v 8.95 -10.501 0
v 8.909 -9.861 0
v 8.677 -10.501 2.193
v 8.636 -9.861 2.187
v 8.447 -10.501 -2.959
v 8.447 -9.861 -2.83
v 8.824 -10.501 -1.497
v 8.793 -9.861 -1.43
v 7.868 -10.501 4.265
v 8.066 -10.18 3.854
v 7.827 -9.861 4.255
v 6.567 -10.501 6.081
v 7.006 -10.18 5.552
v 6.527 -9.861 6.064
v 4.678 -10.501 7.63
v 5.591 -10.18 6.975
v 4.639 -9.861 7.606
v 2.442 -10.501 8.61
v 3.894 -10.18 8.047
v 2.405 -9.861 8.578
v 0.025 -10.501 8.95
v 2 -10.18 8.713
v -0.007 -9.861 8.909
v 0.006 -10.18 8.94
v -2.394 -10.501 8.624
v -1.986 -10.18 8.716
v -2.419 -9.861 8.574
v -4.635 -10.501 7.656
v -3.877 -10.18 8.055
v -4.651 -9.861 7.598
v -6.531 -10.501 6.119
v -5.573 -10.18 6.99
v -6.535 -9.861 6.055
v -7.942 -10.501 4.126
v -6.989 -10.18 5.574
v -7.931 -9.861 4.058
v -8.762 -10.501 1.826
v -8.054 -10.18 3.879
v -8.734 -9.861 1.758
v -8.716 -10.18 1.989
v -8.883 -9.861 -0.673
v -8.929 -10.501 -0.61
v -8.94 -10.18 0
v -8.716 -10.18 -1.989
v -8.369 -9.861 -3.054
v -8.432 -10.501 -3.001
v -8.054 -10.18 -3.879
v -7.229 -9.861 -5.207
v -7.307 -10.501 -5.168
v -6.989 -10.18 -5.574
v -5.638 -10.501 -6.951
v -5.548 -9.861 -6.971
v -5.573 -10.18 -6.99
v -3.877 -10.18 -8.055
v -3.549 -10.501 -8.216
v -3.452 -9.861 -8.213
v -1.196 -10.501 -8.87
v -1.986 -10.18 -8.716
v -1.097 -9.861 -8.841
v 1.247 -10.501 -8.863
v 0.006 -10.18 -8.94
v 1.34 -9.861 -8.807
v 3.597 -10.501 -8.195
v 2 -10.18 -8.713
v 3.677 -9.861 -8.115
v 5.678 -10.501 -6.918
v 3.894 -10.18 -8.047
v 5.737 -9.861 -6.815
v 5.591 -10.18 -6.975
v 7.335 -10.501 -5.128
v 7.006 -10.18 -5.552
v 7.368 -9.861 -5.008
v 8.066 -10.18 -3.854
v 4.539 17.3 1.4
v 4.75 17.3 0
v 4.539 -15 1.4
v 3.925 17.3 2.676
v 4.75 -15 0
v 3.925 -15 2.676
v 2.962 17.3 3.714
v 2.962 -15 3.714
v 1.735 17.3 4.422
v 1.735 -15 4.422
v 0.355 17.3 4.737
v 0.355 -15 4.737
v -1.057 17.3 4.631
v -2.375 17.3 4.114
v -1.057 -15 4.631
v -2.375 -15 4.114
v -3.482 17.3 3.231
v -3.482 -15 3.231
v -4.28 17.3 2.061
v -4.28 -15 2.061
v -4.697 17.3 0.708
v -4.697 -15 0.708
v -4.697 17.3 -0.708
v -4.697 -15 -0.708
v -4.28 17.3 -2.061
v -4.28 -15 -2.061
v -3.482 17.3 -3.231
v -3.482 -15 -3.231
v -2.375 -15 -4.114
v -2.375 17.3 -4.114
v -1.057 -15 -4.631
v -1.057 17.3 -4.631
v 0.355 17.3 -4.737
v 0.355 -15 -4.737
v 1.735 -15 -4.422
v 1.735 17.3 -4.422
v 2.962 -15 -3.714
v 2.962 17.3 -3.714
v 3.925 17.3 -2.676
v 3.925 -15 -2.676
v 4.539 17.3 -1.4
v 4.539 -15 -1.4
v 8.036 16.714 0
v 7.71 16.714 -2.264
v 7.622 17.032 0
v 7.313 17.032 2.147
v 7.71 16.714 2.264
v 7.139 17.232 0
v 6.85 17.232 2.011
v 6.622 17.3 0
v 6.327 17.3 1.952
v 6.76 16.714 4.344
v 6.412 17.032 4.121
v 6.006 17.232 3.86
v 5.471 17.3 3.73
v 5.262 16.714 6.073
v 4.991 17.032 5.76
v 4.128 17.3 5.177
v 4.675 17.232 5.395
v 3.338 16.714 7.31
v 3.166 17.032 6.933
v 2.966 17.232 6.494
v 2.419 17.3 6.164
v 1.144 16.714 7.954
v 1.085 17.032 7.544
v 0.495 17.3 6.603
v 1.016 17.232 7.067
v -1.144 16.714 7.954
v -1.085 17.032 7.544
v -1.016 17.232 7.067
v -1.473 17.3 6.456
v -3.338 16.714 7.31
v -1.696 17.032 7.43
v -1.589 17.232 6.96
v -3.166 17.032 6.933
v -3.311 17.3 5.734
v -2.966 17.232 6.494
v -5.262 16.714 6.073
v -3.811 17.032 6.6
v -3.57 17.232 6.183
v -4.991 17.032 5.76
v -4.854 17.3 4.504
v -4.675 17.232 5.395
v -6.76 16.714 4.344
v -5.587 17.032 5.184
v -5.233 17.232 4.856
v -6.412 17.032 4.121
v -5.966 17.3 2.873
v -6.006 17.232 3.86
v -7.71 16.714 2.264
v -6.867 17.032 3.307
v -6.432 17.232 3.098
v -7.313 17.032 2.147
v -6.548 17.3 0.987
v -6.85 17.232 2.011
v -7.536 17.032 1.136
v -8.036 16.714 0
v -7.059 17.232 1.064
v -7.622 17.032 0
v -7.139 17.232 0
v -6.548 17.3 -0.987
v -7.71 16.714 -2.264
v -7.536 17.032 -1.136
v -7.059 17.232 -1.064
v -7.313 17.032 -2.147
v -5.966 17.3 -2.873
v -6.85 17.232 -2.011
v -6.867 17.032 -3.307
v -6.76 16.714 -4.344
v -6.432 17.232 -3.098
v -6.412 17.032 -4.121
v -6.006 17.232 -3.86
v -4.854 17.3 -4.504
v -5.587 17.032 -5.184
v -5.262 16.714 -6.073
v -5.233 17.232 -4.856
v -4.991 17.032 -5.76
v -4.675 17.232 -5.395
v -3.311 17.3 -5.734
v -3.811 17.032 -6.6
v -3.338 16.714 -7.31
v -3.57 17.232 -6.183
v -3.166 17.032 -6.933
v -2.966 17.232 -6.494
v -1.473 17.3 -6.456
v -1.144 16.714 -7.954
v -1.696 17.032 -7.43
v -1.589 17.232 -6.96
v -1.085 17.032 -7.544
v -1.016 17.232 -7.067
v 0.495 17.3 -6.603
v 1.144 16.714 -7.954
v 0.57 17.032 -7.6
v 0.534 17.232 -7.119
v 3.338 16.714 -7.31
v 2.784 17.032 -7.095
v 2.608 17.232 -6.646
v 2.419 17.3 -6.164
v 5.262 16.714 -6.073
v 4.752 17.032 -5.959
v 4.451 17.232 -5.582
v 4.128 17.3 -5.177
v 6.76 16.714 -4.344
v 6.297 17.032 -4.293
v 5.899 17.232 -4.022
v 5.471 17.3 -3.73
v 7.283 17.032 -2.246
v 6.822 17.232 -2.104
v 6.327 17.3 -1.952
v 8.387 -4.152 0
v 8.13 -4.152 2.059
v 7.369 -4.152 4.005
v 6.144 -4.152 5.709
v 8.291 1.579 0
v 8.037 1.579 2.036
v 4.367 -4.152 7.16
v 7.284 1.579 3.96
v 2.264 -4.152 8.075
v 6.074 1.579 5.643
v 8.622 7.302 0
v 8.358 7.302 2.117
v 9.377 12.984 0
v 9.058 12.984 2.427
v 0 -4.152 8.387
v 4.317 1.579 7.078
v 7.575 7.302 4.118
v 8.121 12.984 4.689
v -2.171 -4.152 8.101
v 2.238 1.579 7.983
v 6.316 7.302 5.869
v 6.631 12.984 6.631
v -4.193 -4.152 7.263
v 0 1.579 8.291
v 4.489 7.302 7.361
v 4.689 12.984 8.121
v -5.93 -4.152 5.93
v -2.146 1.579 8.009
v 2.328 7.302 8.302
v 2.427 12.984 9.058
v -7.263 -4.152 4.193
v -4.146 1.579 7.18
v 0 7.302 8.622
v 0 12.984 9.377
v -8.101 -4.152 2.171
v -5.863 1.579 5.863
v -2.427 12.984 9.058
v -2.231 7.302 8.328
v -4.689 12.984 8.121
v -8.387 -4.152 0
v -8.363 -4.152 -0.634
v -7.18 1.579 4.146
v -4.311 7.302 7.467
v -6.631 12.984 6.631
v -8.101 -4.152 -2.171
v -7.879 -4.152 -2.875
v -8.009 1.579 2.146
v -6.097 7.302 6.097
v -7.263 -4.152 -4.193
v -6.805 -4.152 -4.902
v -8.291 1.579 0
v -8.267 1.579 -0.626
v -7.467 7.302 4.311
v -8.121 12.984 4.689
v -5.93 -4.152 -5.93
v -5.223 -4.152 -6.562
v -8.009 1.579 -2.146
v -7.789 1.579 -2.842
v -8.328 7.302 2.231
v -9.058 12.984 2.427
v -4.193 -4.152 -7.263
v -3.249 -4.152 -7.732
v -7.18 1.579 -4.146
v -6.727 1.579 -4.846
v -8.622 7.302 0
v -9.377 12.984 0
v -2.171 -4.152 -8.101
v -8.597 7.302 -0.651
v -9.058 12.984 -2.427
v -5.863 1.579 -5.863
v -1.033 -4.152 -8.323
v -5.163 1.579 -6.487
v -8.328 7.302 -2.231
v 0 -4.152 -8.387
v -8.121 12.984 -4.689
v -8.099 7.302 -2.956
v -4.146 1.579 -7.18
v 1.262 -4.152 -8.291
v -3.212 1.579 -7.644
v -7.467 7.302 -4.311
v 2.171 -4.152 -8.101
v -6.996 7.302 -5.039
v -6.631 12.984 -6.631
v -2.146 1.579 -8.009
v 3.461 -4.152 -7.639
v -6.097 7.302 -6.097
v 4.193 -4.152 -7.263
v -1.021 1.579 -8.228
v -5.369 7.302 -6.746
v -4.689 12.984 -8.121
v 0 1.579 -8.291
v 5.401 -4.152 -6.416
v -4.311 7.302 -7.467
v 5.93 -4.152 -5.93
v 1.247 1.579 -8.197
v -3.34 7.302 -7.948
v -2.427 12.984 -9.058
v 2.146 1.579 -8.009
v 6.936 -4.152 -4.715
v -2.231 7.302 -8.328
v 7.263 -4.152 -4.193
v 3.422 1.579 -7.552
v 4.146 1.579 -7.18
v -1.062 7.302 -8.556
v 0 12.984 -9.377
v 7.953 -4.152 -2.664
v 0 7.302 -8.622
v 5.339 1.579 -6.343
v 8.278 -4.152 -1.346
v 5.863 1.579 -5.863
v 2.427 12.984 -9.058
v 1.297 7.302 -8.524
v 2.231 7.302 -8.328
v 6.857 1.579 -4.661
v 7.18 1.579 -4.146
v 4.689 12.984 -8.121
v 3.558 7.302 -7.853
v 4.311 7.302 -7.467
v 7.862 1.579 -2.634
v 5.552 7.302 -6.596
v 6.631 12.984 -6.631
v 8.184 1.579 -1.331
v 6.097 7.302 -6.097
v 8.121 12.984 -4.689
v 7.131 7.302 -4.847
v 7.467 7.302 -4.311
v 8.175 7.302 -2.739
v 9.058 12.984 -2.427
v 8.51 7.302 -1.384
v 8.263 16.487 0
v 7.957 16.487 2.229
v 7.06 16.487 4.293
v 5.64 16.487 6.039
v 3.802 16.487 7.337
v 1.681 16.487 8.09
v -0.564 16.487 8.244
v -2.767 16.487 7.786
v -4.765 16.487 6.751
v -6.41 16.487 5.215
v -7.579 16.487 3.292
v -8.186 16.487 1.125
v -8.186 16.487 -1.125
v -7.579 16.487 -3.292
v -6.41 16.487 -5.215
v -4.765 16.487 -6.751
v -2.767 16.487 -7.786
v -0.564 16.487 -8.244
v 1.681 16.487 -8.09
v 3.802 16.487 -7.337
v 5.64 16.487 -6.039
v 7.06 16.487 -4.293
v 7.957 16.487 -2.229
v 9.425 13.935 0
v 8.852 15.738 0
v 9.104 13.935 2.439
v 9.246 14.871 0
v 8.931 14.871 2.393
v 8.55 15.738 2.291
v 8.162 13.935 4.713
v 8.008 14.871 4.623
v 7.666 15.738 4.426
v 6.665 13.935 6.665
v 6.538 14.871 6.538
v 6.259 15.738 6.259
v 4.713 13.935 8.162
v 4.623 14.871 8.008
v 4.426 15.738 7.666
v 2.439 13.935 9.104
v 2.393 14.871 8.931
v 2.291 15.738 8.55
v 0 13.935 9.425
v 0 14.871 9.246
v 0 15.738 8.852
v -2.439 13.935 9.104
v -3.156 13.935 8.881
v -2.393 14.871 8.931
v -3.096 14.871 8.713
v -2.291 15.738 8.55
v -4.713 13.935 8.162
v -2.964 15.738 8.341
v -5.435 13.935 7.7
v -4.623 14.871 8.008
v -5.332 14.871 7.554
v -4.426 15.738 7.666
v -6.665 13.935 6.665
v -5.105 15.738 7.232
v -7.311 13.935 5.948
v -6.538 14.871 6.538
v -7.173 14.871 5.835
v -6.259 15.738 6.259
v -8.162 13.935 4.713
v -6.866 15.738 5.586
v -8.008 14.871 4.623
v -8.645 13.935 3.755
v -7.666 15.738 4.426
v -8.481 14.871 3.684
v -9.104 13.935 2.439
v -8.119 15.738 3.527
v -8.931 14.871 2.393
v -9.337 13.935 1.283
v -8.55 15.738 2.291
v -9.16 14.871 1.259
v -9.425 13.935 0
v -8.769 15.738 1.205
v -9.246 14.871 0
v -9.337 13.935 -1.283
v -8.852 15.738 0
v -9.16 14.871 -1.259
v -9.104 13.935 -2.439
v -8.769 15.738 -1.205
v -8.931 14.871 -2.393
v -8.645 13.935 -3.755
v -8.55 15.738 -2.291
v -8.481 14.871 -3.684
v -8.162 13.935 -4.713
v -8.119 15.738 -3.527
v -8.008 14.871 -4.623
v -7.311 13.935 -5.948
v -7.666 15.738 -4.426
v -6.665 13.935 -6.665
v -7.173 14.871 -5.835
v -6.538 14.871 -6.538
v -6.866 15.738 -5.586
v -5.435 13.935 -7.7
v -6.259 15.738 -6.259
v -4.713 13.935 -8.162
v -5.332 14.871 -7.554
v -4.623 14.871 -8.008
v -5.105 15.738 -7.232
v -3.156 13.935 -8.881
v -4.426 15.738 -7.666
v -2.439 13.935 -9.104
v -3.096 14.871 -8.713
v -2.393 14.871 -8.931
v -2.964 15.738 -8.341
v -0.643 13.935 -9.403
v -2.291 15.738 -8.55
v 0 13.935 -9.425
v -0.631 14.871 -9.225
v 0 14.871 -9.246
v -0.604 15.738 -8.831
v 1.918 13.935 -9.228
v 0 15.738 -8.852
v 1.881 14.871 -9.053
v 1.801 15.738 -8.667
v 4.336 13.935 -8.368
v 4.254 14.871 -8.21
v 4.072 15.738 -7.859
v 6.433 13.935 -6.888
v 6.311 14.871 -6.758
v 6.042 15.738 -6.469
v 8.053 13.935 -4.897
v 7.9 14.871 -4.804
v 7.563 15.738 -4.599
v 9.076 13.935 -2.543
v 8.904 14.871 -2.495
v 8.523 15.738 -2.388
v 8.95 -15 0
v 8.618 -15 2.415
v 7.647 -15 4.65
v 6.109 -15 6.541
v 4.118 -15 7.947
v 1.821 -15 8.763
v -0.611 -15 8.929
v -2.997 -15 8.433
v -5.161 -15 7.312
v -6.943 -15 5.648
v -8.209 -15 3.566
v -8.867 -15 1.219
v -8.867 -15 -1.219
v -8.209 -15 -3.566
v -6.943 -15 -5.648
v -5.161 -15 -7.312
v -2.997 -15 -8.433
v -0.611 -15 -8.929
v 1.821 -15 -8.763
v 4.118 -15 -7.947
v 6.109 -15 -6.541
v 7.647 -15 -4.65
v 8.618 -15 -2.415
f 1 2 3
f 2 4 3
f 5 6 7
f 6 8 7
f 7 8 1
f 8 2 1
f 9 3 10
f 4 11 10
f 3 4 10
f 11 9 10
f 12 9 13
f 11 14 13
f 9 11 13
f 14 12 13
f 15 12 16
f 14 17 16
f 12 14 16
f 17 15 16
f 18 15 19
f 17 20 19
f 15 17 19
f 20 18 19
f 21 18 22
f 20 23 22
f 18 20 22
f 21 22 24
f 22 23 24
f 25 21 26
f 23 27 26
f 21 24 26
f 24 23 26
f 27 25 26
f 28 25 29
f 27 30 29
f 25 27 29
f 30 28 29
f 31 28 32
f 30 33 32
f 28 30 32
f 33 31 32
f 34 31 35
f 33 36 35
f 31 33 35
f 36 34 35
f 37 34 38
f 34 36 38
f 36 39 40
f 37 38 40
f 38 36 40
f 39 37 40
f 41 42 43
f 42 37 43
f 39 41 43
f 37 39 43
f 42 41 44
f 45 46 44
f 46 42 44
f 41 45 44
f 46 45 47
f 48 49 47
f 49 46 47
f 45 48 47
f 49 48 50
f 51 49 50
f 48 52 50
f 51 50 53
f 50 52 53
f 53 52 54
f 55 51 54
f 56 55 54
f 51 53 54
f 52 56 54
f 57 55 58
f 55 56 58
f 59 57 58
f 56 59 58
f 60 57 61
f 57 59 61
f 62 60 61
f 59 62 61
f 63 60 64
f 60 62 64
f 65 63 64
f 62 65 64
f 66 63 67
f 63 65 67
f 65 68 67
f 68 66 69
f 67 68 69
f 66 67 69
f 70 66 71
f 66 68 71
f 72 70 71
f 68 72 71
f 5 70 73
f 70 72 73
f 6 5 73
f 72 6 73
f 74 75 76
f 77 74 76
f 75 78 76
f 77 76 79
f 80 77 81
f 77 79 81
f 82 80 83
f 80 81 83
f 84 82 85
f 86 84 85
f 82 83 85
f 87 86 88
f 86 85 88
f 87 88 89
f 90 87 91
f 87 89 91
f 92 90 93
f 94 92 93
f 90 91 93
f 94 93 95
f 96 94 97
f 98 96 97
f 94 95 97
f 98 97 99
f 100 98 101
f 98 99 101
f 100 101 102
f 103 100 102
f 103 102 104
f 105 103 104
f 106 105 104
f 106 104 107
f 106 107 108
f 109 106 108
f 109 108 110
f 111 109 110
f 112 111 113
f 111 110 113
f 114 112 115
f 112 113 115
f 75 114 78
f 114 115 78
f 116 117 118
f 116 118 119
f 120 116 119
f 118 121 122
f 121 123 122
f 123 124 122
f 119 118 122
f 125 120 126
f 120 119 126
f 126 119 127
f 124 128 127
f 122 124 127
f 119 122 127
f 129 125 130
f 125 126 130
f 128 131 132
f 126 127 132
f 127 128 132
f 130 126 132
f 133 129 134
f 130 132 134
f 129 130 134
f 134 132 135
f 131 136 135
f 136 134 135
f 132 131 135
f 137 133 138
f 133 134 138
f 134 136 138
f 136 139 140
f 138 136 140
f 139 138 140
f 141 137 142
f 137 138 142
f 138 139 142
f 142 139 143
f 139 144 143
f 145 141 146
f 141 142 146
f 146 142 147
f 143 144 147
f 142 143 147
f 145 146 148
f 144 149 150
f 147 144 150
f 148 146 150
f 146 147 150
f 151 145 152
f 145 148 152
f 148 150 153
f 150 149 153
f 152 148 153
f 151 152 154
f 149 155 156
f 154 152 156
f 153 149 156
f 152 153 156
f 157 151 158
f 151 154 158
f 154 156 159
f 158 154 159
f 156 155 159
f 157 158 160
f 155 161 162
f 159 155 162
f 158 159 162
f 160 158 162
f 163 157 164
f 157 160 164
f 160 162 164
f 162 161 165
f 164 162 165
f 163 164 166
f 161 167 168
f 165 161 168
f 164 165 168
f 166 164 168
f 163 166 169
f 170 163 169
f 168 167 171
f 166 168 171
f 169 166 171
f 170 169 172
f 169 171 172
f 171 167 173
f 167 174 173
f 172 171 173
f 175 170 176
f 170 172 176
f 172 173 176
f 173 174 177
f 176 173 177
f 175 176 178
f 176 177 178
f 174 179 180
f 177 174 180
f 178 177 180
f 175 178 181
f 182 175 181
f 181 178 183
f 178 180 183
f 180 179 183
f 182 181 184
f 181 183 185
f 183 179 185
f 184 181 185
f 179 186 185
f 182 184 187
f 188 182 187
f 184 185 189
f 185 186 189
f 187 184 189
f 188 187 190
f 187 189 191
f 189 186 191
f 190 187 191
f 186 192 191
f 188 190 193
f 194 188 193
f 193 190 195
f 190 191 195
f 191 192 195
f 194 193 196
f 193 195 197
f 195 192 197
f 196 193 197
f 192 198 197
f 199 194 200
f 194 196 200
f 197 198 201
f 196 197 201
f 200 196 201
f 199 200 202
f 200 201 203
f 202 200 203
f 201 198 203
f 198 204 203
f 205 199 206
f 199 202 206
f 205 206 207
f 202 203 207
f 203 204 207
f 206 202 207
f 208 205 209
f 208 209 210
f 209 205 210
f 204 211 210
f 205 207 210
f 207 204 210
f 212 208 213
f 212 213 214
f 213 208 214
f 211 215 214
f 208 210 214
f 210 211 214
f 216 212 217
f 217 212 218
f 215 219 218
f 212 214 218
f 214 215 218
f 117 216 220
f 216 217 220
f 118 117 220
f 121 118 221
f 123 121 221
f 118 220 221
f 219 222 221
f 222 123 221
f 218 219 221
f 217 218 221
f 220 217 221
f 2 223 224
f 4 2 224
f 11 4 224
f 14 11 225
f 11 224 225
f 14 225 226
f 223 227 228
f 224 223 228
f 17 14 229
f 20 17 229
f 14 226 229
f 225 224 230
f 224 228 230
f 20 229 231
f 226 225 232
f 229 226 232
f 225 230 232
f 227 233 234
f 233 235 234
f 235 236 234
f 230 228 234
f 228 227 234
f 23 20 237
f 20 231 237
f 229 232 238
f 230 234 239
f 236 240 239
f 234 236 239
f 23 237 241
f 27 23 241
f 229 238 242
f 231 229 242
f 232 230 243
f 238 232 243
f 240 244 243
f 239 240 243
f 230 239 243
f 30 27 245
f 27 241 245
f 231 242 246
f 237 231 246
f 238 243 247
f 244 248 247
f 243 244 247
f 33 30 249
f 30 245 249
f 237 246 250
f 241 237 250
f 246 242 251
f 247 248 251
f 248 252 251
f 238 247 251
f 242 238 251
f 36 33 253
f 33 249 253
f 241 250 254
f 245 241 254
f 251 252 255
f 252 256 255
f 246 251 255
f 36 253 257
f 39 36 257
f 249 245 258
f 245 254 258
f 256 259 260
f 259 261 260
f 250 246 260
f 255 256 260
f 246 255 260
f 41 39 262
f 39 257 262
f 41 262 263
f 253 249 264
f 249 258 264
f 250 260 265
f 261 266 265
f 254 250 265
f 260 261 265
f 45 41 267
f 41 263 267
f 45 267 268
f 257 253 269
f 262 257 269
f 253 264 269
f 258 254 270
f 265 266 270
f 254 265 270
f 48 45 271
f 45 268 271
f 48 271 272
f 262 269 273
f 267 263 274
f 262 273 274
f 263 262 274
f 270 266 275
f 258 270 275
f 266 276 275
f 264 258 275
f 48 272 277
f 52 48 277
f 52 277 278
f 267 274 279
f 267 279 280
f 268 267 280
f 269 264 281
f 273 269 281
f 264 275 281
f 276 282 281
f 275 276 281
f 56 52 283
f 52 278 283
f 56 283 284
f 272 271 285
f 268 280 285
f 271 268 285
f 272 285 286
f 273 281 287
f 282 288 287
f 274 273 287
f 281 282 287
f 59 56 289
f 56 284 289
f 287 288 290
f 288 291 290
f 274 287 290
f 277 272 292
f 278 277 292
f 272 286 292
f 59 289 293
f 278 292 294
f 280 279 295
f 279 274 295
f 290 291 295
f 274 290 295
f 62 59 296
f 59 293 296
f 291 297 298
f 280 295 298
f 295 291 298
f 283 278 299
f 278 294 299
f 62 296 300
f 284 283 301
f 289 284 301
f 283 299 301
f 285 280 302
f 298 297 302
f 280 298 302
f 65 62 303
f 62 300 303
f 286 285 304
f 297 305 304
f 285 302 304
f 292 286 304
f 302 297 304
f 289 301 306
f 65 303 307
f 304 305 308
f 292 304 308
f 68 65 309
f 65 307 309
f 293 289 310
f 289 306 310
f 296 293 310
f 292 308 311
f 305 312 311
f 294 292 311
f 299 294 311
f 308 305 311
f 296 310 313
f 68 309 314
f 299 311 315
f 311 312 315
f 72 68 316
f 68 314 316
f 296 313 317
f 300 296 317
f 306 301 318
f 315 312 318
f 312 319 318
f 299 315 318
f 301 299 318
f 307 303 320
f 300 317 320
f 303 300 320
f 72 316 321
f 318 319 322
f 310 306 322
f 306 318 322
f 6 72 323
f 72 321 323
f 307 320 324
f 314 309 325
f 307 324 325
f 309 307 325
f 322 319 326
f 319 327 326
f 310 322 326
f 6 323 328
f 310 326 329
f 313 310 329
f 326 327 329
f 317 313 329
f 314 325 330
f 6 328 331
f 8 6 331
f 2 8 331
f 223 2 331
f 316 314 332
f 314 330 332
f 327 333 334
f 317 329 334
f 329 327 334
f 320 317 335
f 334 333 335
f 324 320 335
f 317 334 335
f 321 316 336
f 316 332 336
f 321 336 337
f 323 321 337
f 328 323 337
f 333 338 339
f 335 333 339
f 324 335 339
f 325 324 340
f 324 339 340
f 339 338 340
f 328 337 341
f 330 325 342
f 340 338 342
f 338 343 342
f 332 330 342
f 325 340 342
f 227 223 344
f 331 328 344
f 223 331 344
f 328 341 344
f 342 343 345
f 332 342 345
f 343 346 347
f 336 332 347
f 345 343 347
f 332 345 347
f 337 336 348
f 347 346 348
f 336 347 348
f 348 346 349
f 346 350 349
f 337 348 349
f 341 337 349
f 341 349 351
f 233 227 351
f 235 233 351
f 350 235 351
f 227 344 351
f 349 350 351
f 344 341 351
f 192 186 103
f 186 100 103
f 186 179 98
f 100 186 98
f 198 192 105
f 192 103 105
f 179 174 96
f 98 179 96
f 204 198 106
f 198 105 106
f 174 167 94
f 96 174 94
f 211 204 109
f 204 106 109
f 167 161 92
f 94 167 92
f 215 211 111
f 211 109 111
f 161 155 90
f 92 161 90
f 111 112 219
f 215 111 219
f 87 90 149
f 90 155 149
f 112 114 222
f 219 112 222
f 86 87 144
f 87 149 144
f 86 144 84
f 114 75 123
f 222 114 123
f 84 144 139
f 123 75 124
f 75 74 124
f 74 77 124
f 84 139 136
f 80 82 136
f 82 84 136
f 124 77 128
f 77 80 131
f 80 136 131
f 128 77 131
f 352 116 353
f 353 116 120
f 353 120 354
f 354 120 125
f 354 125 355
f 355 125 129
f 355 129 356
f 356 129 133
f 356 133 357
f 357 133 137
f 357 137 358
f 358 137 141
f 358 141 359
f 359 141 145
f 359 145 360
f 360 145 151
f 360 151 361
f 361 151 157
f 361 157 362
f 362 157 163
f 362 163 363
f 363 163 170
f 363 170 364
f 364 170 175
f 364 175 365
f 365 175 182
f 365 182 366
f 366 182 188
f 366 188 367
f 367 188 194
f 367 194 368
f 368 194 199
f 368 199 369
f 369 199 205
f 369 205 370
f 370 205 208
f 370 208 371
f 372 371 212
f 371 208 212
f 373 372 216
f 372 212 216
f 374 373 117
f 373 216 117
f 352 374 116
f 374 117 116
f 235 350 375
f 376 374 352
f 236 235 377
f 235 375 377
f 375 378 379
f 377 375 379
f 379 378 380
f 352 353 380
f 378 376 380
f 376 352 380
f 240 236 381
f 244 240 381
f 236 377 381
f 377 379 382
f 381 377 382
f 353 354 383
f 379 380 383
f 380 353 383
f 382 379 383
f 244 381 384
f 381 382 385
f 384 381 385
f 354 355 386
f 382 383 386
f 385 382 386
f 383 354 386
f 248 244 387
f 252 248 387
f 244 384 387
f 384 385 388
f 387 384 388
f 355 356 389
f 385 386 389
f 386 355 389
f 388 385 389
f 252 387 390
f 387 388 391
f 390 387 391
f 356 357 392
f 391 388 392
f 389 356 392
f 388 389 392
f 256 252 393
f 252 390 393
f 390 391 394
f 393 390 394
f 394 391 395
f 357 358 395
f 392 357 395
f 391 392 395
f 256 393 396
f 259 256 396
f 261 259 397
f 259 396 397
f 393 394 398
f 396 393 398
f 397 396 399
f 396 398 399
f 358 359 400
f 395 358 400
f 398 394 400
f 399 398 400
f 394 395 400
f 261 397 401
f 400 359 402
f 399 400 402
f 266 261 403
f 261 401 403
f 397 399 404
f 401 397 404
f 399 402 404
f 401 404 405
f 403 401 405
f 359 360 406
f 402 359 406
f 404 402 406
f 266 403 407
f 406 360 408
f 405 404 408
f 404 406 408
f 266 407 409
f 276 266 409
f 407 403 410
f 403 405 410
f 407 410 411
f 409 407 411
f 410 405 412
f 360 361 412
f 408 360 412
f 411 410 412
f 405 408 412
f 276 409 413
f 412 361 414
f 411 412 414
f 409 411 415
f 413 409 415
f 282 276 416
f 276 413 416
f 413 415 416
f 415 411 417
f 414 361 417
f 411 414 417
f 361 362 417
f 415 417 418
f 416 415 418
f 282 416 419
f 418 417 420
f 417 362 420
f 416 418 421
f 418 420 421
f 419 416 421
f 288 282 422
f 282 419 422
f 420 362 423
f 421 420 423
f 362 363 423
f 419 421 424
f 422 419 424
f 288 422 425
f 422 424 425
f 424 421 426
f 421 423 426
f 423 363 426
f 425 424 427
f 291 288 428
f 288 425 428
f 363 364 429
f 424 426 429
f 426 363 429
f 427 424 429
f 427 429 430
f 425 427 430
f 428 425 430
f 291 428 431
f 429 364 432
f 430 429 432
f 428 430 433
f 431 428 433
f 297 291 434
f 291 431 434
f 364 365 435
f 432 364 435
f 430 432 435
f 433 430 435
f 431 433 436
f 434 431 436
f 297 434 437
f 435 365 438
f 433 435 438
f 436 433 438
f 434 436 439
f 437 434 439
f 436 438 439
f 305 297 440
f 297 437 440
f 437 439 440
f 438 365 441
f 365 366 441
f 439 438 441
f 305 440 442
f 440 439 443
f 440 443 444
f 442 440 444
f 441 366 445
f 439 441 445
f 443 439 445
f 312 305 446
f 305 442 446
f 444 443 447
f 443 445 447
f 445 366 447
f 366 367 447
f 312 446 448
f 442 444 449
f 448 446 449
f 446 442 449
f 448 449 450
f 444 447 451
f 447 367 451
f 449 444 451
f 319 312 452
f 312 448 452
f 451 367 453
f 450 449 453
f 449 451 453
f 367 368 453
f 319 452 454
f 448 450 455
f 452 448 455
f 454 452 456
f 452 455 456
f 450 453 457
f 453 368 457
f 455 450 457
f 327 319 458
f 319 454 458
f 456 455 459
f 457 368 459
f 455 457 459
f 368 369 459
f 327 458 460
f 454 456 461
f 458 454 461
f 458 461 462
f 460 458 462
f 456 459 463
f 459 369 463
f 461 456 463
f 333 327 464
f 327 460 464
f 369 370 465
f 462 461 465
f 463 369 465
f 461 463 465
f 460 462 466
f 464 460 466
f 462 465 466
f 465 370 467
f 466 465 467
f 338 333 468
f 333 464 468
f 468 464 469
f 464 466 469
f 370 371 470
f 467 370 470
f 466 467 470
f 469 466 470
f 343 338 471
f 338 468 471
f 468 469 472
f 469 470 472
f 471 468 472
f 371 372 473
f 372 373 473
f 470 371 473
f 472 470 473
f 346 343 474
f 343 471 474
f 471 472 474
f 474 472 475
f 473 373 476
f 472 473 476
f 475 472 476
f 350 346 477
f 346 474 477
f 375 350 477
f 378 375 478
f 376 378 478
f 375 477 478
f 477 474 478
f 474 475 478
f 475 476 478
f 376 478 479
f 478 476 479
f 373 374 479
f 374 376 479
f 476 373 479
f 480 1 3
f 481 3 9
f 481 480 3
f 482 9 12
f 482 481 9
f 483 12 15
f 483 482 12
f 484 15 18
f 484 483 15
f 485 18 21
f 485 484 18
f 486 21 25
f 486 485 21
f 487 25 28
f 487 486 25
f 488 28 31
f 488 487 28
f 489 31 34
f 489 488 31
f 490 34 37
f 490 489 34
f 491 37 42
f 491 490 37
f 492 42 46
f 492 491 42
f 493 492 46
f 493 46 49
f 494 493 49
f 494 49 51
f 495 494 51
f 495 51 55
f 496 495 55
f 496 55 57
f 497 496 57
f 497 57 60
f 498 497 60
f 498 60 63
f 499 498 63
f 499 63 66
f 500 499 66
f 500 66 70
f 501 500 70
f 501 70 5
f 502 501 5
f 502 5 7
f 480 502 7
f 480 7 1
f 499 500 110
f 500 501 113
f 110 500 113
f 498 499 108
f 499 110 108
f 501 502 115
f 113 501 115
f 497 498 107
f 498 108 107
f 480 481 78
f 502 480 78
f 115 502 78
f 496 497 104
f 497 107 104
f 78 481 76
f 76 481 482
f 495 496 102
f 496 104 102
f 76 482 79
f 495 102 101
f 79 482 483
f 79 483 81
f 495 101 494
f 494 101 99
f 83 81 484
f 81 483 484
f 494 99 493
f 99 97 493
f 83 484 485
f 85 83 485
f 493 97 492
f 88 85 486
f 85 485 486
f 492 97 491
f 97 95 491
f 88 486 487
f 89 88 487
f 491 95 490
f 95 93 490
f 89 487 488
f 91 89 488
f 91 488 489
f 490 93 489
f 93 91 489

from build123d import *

# Parameters (mm, degrees)
F2_R     = 2
F3_R     = 9.75
F3_R_2   = 8.95
F4_DEPTH = 10
F5_R     = 5


with BuildPart() as f1:
    # F0 (on Top) → F1 (revolve)
    with BuildSketch(Plane.XY):
        with BuildLine():
            ThreePointArc((9.75, -15), (8.281654, -1.025091), (9.37742, 12.983957))
            ThreePointArc((9.37742, 12.983957), (9.246485, 14.870996), (8.263125, 16.486875))
            Line((8.263125, 16.486875), (7.45, 17.3))
            Line((7.45, 17.3), (4.75, 17.3))
            Line((4.75, 17.3), (4.75, -15))
            Line((4.75, -15), (9.75, -15))
        make_face()
    revolve(axis=Axis((0, -4.586624, 0), (0, -1, 0)))

    # F2
    f2_edges = [f1.edges().sort_by_distance(p)[0] for p in [
        (-7.45, 17.3, 0),
    ]]
    fillet(f2_edges, radius=F2_R)

    # F3 (on face) → F4 (cut)
    with BuildSketch(Plane.XZ.offset(15)):
        Circle(F3_R)
        Circle(F3_R_2, mode=Mode.SUBTRACT)
    extrude(amount=-F4_DEPTH, mode=Mode.SUBTRACT)

    # F5
    f5_edges = [f1.edges().sort_by_distance(p)[0] for p in [
        (-8.95, -10.174491, 0),
        (8.287942, 1.420896, 0),
        (-9.37742, 12.983957, 0),
    ]]
    fillet(f5_edges, radius=F5_R)


solid = f1.part
